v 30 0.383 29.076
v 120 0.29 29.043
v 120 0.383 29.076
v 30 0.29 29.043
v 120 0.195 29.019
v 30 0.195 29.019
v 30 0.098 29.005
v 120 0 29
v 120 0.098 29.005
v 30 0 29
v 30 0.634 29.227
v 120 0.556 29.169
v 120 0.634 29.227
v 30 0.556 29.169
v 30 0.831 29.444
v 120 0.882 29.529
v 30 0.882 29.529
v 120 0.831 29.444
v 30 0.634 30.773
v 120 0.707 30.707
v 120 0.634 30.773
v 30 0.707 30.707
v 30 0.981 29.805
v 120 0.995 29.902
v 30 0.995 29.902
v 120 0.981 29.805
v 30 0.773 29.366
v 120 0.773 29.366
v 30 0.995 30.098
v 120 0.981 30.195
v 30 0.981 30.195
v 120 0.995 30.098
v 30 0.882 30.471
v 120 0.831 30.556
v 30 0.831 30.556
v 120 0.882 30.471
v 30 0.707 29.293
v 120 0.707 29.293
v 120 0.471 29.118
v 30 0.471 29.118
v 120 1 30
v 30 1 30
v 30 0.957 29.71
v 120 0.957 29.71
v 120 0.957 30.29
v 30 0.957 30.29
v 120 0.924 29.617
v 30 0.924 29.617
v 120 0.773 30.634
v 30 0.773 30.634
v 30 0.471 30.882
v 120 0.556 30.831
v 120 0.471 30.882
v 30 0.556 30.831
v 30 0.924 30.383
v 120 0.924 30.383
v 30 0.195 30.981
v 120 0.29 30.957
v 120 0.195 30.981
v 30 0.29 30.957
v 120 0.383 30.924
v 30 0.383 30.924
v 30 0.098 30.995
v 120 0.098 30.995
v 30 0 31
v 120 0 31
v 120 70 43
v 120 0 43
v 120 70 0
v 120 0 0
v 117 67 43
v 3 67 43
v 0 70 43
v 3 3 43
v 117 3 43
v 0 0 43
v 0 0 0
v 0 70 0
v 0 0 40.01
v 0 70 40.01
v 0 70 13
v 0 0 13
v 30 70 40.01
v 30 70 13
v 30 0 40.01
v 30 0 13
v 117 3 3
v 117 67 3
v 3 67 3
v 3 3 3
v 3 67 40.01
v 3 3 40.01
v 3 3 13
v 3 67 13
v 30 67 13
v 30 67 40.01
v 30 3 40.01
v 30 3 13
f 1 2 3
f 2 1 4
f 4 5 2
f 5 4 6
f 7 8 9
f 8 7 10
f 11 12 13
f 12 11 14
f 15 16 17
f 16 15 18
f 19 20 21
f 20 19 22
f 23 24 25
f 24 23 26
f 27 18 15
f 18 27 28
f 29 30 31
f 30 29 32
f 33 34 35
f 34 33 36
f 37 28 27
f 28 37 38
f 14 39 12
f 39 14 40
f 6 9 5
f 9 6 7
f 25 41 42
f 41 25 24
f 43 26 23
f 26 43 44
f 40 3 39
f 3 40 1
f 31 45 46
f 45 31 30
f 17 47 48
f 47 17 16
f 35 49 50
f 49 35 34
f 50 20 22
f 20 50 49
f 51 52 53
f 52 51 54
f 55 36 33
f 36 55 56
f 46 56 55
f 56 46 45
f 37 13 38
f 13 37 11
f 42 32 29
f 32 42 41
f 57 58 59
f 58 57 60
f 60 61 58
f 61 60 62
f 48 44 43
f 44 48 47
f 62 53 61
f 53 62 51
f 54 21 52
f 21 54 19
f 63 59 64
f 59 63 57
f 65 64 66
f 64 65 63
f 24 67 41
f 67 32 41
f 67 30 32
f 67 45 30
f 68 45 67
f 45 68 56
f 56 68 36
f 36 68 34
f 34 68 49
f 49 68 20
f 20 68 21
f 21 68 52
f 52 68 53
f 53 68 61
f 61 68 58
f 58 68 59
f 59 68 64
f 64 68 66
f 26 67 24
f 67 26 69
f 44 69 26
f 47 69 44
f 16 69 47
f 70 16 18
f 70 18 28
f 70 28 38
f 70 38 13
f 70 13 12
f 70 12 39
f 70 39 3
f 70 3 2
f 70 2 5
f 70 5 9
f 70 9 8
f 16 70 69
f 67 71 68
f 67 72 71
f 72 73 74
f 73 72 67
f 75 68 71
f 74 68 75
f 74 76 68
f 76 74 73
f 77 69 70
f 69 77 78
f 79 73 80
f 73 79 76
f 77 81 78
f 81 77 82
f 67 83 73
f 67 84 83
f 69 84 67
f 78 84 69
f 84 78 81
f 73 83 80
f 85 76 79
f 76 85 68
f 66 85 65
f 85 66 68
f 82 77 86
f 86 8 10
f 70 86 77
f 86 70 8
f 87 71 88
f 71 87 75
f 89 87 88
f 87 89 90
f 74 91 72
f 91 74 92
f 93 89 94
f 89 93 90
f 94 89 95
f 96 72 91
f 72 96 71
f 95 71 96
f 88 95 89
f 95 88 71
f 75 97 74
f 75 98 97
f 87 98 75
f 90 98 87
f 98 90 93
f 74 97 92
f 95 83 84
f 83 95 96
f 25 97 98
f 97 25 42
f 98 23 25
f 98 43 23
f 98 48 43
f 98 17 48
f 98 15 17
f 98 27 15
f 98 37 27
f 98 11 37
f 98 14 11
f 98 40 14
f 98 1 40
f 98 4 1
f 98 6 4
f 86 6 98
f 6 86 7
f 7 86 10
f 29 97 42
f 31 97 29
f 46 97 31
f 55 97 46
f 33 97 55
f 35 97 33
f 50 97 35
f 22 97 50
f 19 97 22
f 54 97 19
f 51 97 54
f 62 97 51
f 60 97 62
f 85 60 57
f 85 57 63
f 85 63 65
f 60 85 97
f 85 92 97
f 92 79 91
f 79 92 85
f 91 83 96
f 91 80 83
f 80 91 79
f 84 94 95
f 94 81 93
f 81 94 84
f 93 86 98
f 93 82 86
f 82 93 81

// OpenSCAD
// Mini horizontal gel-electrophoresis box - buffer tank
// Print orientation: tank rests on XY plane, builds up in +Z

$fn = 64;

// ---- Tank dimensions ----
outer_x = 120;   // outer length in X
outer_y = 70;    // outer width in Y
outer_z = 40;    // outer height in Z
wall    = 3;     // wall thickness (X and Y)
floor   = 3;     // floor thickness under the inner floor

// ---- Platform dimensions ----
plat_x     = 60;   // platform length in X (centred)
plat_w     = outer_y;  // platform spans full inner width
plat_top_z = 13;   // platform top height (10 mm above inner floor: z=floor+10)

// ---- Electrode holes ----
hole_d     = 2;    // hole diameter
hole_y     = 0;    // hole Y position
hole_z     = 30;   // hole Z position

// ---- Cutting overlap ----
eps = 0.5;        // extension past cut faces

difference() {
    // Tank body (solid through the floor, open top)
    cube([outer_x, outer_y, outer_z + floor]);

    // Inner cavity (from inner floor up, open top)
    translate([wall, wall, floor])
        cube([outer_x - 2*wall, outer_y - 2*wall, outer_z]);

    // Raised platform for gel tray
    translate([-plat_x/2, 0, plat_top_z])
        cube([plat_x, plat_w, outer_z - plat_top_z + 0.01]);

    // Electrode holes through each end wall along X
    for (sx = [-1, 1])
        translate([sx > 0 ? outer_x - eps : -eps, hole_y, hole_z])
            rotate([0, 90, 0])
                cylinder(d = hole_d, h = outer_x + 2*eps);
}
